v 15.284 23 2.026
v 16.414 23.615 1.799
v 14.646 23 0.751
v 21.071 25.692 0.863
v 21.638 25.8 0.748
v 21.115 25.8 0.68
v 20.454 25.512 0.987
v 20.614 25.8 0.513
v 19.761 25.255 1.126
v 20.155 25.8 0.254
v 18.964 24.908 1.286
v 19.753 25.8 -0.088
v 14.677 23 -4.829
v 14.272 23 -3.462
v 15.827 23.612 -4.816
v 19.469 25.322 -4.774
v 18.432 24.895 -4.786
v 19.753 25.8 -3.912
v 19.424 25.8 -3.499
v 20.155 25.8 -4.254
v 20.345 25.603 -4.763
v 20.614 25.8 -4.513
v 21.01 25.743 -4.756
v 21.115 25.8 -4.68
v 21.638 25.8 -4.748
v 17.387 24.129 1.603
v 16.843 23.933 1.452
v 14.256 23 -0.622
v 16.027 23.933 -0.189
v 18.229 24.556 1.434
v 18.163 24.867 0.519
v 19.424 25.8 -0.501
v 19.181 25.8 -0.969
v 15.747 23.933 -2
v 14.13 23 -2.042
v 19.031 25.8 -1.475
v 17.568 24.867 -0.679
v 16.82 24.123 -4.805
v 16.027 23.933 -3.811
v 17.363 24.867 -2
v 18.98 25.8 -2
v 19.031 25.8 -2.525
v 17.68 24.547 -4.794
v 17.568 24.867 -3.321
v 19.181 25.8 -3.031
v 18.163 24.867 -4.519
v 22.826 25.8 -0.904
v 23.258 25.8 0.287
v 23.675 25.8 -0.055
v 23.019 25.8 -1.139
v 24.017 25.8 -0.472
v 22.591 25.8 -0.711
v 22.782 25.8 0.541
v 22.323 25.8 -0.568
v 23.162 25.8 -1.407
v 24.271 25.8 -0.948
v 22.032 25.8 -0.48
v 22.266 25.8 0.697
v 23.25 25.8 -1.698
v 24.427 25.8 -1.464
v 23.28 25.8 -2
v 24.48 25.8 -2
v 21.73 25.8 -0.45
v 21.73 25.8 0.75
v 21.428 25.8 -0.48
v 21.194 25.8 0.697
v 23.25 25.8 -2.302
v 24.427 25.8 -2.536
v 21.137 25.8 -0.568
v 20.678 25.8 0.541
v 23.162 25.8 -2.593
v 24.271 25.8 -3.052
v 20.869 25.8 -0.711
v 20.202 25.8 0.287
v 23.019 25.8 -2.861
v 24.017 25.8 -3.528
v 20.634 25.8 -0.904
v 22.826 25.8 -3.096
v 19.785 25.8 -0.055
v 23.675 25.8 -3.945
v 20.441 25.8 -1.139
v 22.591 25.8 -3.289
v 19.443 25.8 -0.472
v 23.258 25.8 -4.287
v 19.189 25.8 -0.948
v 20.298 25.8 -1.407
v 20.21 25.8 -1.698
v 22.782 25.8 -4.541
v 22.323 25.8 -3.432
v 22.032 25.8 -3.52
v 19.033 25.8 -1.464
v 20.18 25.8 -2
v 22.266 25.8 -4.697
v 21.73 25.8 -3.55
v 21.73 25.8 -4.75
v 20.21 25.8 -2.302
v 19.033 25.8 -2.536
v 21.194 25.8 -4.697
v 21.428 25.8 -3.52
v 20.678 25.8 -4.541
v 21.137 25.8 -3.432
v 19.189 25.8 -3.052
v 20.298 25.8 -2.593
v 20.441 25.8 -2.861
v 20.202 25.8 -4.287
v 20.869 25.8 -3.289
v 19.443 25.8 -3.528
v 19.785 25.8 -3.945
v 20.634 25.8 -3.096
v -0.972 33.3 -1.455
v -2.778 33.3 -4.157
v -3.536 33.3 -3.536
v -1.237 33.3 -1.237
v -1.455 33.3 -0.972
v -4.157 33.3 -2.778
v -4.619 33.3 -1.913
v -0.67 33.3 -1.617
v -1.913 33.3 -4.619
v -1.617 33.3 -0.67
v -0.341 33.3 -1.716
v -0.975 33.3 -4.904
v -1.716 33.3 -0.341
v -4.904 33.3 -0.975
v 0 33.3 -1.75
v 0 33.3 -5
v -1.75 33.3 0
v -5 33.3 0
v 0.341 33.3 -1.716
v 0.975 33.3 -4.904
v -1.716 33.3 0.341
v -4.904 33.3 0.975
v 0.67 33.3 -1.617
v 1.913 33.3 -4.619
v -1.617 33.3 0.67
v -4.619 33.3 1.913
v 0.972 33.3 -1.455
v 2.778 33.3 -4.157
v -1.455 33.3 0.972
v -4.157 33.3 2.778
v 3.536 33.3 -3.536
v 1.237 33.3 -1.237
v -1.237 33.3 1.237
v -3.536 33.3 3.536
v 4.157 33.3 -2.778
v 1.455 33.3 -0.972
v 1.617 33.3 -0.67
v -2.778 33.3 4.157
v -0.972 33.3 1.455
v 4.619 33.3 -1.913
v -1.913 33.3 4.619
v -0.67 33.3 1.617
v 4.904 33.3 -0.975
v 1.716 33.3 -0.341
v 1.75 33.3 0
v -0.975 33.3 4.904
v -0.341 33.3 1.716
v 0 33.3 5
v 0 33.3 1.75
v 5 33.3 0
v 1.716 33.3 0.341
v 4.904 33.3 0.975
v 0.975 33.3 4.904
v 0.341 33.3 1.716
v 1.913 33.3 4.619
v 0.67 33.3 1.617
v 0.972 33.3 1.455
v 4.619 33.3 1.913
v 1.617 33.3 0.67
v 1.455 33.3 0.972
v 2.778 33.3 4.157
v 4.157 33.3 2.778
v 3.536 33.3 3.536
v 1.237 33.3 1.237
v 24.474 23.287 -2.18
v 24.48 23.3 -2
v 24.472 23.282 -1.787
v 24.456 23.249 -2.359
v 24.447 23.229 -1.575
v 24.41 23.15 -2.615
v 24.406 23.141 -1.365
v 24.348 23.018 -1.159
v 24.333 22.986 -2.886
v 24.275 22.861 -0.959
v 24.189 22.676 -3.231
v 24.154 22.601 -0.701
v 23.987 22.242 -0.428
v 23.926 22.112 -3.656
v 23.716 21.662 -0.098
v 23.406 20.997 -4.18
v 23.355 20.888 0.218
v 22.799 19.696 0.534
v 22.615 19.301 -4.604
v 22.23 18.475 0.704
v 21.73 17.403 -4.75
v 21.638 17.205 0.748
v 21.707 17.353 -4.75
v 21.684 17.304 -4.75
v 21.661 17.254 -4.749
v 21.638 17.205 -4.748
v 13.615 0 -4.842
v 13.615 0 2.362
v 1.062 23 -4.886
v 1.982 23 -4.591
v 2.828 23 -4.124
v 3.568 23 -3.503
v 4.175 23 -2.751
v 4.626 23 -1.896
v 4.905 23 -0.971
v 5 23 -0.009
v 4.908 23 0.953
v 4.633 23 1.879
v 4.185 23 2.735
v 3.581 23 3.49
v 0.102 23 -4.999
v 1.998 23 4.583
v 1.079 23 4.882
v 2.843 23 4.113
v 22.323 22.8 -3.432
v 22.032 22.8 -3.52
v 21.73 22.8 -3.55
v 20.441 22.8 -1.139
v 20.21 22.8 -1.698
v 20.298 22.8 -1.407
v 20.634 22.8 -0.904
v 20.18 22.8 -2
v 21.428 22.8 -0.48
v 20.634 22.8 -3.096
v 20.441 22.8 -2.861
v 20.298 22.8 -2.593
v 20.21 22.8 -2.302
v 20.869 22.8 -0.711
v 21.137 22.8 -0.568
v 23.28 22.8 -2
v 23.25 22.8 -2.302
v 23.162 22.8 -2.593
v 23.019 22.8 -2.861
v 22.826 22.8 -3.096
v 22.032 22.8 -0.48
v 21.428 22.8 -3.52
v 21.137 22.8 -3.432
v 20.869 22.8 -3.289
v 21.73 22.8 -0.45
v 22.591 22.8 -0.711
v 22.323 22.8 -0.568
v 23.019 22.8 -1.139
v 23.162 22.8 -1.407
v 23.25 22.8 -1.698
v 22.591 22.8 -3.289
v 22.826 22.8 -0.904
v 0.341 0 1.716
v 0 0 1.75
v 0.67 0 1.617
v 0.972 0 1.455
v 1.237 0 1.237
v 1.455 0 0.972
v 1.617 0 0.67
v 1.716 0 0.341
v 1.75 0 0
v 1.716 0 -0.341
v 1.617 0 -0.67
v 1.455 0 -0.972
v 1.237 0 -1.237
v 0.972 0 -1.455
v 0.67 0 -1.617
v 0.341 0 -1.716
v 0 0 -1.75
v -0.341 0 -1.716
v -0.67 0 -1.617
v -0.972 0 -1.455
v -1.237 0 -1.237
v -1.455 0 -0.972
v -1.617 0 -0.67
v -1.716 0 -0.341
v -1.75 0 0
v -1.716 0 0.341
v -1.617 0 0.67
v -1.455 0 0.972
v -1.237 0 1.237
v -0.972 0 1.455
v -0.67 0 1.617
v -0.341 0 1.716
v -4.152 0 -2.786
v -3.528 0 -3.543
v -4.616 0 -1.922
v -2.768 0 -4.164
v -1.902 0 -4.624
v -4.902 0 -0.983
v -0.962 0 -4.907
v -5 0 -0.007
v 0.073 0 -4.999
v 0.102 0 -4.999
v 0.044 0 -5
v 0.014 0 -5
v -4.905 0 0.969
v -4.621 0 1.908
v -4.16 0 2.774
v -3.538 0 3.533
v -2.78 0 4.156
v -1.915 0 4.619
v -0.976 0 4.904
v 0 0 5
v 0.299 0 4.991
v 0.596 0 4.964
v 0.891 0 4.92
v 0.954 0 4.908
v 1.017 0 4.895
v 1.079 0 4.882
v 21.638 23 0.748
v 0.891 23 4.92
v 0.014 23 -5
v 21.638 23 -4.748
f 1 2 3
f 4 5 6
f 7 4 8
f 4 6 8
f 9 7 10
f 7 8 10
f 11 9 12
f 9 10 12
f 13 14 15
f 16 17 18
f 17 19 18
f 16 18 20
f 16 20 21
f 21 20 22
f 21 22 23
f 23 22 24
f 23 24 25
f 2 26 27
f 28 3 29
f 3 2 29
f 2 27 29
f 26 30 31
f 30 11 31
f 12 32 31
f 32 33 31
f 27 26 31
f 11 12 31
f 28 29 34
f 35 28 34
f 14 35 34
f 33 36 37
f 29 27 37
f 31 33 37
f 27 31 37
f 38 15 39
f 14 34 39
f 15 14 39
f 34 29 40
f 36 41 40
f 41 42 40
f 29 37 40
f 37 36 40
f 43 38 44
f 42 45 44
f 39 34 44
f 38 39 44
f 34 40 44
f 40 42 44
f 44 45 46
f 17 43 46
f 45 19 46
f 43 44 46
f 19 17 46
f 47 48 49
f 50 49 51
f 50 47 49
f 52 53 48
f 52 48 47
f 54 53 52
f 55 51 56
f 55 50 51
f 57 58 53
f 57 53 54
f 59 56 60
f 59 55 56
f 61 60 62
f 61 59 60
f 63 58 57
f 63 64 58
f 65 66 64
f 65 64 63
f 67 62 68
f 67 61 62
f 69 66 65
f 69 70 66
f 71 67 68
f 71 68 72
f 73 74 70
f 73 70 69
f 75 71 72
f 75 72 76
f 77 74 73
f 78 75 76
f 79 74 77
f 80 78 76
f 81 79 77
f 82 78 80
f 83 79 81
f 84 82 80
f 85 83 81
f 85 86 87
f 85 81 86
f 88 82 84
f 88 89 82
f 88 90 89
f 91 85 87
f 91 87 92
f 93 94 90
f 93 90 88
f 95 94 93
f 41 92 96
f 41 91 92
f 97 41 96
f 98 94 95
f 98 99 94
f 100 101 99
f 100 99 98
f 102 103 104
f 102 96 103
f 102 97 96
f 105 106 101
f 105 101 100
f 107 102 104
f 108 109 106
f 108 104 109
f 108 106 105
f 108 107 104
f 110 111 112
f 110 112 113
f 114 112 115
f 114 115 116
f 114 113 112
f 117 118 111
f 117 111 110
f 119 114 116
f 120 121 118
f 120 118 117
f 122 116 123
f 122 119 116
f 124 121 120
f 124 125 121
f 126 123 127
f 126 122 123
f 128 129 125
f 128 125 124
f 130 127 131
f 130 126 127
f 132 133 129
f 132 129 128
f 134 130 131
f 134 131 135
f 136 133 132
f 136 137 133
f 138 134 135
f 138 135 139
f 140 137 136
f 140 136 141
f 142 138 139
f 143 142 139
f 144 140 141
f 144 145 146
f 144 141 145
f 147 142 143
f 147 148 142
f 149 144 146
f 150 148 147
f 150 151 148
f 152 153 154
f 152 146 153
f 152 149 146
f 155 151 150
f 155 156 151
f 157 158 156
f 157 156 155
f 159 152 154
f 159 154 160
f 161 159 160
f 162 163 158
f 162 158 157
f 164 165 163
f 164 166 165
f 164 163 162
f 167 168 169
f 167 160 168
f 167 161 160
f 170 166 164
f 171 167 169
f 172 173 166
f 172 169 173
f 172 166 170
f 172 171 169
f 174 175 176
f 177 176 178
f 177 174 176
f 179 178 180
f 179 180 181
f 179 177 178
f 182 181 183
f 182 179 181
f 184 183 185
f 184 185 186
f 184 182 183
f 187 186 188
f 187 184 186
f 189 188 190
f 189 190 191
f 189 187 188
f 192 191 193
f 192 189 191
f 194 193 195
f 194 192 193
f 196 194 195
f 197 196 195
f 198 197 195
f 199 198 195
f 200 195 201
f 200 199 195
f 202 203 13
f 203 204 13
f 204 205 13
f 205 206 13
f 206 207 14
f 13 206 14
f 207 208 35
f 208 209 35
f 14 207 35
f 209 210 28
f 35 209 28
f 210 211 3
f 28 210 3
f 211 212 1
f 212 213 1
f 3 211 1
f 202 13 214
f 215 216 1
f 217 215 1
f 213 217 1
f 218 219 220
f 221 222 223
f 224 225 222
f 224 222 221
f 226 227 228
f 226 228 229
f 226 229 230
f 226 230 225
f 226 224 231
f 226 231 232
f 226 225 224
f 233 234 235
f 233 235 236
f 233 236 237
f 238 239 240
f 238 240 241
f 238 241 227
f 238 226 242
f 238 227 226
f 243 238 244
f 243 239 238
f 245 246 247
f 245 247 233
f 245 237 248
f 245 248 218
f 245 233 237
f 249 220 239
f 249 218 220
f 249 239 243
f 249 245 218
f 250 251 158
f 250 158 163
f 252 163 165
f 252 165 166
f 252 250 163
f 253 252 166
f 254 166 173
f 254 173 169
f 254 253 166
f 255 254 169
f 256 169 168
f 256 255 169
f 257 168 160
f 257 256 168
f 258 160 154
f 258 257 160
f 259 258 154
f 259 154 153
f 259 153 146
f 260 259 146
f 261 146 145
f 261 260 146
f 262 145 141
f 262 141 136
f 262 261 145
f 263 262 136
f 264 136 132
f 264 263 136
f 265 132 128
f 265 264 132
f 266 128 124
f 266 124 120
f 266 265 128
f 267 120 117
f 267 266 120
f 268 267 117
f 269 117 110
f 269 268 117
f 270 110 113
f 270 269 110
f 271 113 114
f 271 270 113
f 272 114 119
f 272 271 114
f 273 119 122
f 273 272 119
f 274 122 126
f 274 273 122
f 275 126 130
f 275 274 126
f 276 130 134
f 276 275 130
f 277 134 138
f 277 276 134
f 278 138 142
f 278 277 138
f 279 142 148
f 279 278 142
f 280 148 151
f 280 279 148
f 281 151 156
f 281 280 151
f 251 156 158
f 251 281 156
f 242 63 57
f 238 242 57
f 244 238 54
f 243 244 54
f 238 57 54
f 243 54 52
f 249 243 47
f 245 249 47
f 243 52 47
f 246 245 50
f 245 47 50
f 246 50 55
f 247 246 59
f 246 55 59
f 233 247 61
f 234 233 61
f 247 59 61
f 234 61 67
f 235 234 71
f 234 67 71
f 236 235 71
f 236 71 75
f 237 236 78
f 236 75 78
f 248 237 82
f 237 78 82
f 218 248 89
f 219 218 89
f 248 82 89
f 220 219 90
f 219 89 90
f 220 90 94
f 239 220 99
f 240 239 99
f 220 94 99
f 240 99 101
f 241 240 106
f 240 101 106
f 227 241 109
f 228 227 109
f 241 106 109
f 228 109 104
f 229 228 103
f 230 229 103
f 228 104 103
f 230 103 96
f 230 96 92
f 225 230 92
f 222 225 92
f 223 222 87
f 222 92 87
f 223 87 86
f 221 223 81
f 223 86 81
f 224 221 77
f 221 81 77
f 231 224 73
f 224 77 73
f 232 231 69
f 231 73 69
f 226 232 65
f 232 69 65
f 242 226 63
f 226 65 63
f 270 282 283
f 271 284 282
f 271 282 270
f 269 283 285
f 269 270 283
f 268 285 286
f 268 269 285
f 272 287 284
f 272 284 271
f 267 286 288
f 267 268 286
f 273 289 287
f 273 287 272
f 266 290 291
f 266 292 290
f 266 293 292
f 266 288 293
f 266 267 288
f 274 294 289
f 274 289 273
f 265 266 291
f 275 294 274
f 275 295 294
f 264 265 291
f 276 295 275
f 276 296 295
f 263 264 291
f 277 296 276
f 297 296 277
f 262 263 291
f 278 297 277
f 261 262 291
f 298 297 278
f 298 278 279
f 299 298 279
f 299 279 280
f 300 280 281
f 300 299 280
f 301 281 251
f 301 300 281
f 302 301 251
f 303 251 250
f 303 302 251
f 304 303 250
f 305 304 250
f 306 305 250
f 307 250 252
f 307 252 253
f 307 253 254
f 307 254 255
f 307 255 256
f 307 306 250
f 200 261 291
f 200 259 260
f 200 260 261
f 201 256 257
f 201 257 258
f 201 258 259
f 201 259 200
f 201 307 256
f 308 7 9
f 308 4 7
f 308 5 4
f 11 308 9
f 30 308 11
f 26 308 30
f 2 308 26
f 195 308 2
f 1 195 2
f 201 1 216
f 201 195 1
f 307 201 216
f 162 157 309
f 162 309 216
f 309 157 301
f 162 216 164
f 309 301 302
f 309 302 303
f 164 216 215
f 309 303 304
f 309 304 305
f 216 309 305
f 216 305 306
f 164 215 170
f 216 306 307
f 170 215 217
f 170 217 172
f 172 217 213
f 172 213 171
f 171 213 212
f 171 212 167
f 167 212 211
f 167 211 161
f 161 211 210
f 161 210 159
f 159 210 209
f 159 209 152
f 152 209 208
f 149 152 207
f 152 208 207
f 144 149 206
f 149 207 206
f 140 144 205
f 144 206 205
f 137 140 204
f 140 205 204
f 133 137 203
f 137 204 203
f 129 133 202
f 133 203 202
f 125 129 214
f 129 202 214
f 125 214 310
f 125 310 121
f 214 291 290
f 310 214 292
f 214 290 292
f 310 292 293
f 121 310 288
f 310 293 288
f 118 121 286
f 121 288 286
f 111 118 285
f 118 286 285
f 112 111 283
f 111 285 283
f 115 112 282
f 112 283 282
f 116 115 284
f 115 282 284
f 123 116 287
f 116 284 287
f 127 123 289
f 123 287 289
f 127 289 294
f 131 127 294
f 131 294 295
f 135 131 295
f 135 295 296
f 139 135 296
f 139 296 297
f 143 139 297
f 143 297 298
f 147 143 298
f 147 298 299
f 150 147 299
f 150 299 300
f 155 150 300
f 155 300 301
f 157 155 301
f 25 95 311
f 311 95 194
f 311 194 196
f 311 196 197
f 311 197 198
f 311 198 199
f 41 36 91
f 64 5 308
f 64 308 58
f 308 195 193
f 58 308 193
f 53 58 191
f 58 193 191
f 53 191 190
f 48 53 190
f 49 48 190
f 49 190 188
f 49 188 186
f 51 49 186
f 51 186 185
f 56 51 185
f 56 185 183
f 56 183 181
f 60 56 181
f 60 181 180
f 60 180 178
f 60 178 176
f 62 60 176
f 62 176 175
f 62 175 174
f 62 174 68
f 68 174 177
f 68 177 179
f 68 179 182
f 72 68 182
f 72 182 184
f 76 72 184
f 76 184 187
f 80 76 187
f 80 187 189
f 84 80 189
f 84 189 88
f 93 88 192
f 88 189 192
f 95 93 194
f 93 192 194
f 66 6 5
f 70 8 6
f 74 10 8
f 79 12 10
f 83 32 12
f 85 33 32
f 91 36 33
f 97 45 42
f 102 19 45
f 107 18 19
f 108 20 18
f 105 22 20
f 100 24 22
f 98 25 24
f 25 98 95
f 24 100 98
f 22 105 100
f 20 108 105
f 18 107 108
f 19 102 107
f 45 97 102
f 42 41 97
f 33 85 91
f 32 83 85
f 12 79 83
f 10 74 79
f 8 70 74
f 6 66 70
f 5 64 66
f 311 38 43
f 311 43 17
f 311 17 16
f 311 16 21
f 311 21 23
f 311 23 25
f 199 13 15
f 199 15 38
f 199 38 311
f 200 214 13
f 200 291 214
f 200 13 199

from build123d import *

# Parameters (mm, degrees)
SKETCH1_R               = 5
SKETCH1_R_2             = 1.75
BOSS_EXTRUDE1_DEPTH     = 33.3
SKETCH2_R               = 2.75
BOSS_EXTRUDE2_DEPTH     = 25.8
BOSS_EXTRUDE3_DEPTH     = 23
SKETCH3_R               = 1.55
CUT_EXTRUDE1_DEPTH      = 3
CUT_EXTRUDE2_DEPTH      = 42.631243075
CUT_EXTRUDE2_DEPTH_BACK = 42.631243075
CHAMFER3_SIZE2          = 2.8
CHAMFER3_SIZE           = 4.849742261


with BuildPart() as part:
    # Sketch1 → Boss-Extrude1 (new body)
    with BuildSketch(Plane(origin=(0, 0, 0), x_dir=(1, 0, 0), z_dir=(0, 1, 0))):
        with Locations(Location((0, 0, 0), (0, 0, 270))):
            Circle(SKETCH1_R)
        with Locations(Location((0, 0, 0), (0, 0, 270))):
            Circle(SKETCH1_R_2, mode=Mode.SUBTRACT)
    extrude(amount=BOSS_EXTRUDE1_DEPTH)



with BuildPart() as body_2:
    # Sketch2 → Boss-Extrude2 (new body)
    with BuildSketch(Plane(origin=(0, 0, 0), x_dir=(1, 0, 0), z_dir=(0, 1, 0))):
        with Locations(Location((21.73, 2, 0), (0, 0, 90))):
            Circle(SKETCH2_R)
    extrude(amount=BOSS_EXTRUDE2_DEPTH)


with BuildPart() as part_1:
    add(part.part)

    add(body_2.part)  # Boss-Extrude3 merges body 2
    # Sketch4 → Boss-Extrude3 (add)
    with BuildSketch(Plane.XZ):
        Polygon((21.637816883, 0.748454524), (0.891372697, 4.919903934), (2.67017604, 0), (0.014392721, -4.999979285), (21.637816883, -4.748454524), align=None)
    extrude(amount=-BOSS_EXTRUDE3_DEPTH)

    # Sketch3 → Cut-Extrude1 (cut)
    with BuildSketch(Plane(origin=(0, 25.8, 0), x_dir=(1, 0, 0), z_dir=(0, 1, 0))):
        with Locations(Location((21.73, 2, 0), (0, 0, 270))):
            Circle(SKETCH3_R)
    extrude(amount=-CUT_EXTRUDE1_DEPTH, mode=Mode.SUBTRACT)

    # Sketch5 → Cut-Extrude2 (cut, two sides: drawn at the far end of the back side and taken through both)
    with BuildSketch(Plane.XY.offset(-CUT_EXTRUDE2_DEPTH_BACK)):
        Polygon((24.48, 23.3), (12.590189784, -2.197780292), (24.48, 0), (24.48, 11.782113075), align=None)
    extrude(amount=CUT_EXTRUDE2_DEPTH + CUT_EXTRUDE2_DEPTH_BACK, mode=Mode.SUBTRACT)

    # Chamfer3
    chamfer3_edges = [part_1.edges().sort_by_distance(p)[0] for p in [
        (18.98, 23, -2),
    ]]
    chamfer3_side = [part_1.faces().sort_by_distance(p)[0] for p in [
        (18.924, 23, -2),
    ]]
    chamfer(chamfer3_edges, length=CHAMFER3_SIZE - 0.0001, length2=CHAMFER3_SIZE2 - 0.0001, reference=chamfer3_side[0])  # a hair under: the kernel refuses the full size


solid = part_1.part
